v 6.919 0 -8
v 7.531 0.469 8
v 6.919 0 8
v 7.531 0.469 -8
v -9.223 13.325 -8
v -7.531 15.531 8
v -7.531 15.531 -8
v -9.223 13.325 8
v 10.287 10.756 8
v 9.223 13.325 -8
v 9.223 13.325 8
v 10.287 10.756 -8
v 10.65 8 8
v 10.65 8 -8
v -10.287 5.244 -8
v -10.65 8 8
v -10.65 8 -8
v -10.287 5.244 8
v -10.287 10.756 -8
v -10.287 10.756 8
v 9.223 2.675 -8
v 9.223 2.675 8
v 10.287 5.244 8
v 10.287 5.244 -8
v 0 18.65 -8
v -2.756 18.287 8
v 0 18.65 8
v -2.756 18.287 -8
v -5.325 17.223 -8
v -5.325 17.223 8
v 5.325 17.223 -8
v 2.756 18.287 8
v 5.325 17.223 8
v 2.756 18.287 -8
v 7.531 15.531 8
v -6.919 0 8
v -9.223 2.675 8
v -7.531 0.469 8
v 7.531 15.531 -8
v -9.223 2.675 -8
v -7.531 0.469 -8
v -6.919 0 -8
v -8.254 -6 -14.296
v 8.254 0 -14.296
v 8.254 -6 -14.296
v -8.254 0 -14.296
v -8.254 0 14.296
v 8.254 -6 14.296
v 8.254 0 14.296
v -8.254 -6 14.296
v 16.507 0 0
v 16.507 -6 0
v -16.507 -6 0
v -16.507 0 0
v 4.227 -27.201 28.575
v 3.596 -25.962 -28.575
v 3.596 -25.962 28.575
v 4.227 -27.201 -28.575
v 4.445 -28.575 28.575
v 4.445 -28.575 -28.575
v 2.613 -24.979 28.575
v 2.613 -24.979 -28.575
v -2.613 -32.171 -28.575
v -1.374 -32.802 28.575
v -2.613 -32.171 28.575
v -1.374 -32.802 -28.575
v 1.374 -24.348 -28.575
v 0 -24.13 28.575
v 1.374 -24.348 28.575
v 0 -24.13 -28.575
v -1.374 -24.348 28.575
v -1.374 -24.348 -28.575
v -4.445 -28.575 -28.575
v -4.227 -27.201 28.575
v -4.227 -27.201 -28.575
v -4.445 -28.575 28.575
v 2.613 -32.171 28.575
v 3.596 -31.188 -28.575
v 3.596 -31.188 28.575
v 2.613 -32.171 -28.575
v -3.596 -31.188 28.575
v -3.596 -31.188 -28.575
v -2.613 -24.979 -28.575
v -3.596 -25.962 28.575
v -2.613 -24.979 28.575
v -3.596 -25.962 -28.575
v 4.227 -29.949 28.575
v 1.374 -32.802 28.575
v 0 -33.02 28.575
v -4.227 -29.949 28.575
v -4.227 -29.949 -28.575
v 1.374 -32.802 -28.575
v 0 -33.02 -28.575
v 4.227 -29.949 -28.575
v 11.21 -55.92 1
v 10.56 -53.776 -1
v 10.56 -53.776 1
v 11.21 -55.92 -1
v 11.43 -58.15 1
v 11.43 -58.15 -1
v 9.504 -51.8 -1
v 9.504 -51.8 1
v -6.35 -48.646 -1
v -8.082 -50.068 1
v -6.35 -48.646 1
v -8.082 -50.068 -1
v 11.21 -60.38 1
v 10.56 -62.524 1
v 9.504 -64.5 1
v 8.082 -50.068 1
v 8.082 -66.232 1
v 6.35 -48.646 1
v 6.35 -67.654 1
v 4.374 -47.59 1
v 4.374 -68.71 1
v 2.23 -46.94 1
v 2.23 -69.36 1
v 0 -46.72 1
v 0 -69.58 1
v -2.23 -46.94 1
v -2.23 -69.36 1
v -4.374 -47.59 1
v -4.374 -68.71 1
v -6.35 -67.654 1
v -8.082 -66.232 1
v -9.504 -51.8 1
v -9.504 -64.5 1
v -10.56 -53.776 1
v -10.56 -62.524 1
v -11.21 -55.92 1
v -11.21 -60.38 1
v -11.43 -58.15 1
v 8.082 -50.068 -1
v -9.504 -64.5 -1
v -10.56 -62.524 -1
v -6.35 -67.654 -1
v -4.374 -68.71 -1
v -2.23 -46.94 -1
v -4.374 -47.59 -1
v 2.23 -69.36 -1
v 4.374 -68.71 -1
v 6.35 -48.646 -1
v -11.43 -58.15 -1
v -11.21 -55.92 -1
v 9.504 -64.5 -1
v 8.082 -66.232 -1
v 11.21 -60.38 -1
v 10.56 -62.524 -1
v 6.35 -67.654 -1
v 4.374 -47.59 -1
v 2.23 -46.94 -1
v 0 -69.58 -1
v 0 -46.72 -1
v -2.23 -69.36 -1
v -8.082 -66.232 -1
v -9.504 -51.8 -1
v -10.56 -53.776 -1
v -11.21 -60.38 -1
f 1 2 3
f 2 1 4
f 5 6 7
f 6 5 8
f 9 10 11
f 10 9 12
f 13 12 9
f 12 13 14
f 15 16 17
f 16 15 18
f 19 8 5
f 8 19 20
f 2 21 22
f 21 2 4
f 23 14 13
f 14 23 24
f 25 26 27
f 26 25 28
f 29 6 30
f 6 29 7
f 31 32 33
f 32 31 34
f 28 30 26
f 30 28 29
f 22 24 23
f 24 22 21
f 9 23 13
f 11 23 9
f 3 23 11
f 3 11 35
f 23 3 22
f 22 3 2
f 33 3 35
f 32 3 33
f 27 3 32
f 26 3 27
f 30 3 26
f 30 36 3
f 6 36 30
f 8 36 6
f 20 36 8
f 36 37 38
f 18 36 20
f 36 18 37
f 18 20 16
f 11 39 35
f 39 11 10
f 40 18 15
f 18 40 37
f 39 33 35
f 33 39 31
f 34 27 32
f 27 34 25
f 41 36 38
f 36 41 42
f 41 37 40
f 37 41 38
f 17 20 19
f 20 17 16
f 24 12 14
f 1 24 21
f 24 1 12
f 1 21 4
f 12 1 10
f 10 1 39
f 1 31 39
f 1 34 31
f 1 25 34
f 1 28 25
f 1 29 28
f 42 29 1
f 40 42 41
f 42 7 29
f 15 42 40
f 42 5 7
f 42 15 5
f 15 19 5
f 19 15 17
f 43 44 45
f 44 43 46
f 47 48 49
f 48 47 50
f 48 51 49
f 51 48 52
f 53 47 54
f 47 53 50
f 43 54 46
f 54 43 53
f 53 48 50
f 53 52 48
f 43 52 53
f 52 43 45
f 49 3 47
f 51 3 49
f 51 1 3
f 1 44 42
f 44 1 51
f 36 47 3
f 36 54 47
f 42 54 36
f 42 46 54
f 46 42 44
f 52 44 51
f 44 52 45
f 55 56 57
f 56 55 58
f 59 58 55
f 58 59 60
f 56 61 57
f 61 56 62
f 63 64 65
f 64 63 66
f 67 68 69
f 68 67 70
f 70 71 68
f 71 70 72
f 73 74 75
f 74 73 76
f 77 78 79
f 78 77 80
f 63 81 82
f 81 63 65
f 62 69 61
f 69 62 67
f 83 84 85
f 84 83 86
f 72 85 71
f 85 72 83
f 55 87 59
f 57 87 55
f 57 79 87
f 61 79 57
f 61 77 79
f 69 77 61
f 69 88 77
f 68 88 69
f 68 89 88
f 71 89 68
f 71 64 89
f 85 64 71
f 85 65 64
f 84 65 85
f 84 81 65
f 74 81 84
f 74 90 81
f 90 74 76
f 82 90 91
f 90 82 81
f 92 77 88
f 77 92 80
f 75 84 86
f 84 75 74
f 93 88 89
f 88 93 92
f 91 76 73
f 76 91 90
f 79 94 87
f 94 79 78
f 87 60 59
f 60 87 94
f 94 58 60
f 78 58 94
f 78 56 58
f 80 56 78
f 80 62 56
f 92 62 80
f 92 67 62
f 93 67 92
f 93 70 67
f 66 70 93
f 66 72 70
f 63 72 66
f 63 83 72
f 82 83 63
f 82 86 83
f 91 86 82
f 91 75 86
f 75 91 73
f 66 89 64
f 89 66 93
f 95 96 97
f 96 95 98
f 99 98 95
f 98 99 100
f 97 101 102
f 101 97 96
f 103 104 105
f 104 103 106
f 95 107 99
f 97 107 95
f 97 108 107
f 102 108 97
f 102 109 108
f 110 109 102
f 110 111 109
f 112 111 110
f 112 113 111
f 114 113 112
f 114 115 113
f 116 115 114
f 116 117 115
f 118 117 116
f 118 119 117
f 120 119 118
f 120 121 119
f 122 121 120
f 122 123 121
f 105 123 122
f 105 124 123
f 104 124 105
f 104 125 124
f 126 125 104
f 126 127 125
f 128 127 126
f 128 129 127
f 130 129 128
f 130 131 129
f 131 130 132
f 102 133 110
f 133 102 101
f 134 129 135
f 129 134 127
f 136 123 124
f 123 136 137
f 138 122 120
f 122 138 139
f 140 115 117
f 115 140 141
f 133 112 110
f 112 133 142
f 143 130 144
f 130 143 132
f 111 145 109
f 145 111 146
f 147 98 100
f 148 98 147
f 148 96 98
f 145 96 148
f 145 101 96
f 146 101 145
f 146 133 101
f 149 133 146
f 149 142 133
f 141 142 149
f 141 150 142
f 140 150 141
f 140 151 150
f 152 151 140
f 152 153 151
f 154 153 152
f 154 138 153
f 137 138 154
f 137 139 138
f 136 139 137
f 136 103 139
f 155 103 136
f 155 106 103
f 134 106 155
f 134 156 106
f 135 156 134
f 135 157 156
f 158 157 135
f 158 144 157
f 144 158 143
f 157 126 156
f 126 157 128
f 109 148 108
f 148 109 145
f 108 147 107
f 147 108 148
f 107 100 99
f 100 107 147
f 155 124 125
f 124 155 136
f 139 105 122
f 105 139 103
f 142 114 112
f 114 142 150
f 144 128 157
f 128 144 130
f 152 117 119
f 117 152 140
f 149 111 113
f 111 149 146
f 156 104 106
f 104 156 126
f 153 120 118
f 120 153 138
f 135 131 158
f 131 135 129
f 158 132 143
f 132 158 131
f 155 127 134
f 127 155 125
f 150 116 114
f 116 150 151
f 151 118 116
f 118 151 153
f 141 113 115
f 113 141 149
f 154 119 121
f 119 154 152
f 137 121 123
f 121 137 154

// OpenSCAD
// Auto-generated by scripts/author_from_manifest.py (Phase D.3).
// Source: data/phase_d_manifest.json (sku_intent='tyco-ty3231-institutional-200f').
// Do not hand-edit — regenerate from the manifest.
//
// @part tyco_ty3231_institutional_200f
// @kind sprinkler_head
// @category head.pendant.k56
// @display-name "Tyco TY3231 Institutional Pendent K5.6 200°F"
// @mfg tyco_fire_protection
// @mfg-pn TY3231
// @listing UL FM
// @hazard-classes LH OH1
// @price-usd 62.00
// @install-minutes 10
// @crew journeyman
// @k-factor 5.6
// @orientation pendant
// @response quick
// @temperature 200F
// @param size_in number default=0.5 label="Size" unit="in"
// @port inlet position=[0,0.014,0] direction=[0,1,0] style=NPT_threaded size_in=0.5 role=drop

size_in = 0.5;
k_factor = 5.6;

length_mm   = 57.15;
body_dia_mm = 25.40;
thread_od   = 21.3;
thread_len  = 16;
deflector_d = body_dia_mm * 0.9;

 union() {
    translate([0, thread_len/2, 0])
        cylinder(h = thread_len, d = thread_od, center = true, $fn = 24);
    translate([0, -3, 0])
        rotate([90, 0, 0])
        cylinder(h = 6, d = thread_od * 1.55, $fn = 6, center = true);
    translate([0, -length_mm/2, 0])
        cylinder(h = length_mm, d = body_dia_mm * 0.35, center = true, $fn = 20);
    translate([0, -length_mm - 1, 0])
        cylinder(h = 2, d = deflector_d, center = true, $fn = 32);
}
